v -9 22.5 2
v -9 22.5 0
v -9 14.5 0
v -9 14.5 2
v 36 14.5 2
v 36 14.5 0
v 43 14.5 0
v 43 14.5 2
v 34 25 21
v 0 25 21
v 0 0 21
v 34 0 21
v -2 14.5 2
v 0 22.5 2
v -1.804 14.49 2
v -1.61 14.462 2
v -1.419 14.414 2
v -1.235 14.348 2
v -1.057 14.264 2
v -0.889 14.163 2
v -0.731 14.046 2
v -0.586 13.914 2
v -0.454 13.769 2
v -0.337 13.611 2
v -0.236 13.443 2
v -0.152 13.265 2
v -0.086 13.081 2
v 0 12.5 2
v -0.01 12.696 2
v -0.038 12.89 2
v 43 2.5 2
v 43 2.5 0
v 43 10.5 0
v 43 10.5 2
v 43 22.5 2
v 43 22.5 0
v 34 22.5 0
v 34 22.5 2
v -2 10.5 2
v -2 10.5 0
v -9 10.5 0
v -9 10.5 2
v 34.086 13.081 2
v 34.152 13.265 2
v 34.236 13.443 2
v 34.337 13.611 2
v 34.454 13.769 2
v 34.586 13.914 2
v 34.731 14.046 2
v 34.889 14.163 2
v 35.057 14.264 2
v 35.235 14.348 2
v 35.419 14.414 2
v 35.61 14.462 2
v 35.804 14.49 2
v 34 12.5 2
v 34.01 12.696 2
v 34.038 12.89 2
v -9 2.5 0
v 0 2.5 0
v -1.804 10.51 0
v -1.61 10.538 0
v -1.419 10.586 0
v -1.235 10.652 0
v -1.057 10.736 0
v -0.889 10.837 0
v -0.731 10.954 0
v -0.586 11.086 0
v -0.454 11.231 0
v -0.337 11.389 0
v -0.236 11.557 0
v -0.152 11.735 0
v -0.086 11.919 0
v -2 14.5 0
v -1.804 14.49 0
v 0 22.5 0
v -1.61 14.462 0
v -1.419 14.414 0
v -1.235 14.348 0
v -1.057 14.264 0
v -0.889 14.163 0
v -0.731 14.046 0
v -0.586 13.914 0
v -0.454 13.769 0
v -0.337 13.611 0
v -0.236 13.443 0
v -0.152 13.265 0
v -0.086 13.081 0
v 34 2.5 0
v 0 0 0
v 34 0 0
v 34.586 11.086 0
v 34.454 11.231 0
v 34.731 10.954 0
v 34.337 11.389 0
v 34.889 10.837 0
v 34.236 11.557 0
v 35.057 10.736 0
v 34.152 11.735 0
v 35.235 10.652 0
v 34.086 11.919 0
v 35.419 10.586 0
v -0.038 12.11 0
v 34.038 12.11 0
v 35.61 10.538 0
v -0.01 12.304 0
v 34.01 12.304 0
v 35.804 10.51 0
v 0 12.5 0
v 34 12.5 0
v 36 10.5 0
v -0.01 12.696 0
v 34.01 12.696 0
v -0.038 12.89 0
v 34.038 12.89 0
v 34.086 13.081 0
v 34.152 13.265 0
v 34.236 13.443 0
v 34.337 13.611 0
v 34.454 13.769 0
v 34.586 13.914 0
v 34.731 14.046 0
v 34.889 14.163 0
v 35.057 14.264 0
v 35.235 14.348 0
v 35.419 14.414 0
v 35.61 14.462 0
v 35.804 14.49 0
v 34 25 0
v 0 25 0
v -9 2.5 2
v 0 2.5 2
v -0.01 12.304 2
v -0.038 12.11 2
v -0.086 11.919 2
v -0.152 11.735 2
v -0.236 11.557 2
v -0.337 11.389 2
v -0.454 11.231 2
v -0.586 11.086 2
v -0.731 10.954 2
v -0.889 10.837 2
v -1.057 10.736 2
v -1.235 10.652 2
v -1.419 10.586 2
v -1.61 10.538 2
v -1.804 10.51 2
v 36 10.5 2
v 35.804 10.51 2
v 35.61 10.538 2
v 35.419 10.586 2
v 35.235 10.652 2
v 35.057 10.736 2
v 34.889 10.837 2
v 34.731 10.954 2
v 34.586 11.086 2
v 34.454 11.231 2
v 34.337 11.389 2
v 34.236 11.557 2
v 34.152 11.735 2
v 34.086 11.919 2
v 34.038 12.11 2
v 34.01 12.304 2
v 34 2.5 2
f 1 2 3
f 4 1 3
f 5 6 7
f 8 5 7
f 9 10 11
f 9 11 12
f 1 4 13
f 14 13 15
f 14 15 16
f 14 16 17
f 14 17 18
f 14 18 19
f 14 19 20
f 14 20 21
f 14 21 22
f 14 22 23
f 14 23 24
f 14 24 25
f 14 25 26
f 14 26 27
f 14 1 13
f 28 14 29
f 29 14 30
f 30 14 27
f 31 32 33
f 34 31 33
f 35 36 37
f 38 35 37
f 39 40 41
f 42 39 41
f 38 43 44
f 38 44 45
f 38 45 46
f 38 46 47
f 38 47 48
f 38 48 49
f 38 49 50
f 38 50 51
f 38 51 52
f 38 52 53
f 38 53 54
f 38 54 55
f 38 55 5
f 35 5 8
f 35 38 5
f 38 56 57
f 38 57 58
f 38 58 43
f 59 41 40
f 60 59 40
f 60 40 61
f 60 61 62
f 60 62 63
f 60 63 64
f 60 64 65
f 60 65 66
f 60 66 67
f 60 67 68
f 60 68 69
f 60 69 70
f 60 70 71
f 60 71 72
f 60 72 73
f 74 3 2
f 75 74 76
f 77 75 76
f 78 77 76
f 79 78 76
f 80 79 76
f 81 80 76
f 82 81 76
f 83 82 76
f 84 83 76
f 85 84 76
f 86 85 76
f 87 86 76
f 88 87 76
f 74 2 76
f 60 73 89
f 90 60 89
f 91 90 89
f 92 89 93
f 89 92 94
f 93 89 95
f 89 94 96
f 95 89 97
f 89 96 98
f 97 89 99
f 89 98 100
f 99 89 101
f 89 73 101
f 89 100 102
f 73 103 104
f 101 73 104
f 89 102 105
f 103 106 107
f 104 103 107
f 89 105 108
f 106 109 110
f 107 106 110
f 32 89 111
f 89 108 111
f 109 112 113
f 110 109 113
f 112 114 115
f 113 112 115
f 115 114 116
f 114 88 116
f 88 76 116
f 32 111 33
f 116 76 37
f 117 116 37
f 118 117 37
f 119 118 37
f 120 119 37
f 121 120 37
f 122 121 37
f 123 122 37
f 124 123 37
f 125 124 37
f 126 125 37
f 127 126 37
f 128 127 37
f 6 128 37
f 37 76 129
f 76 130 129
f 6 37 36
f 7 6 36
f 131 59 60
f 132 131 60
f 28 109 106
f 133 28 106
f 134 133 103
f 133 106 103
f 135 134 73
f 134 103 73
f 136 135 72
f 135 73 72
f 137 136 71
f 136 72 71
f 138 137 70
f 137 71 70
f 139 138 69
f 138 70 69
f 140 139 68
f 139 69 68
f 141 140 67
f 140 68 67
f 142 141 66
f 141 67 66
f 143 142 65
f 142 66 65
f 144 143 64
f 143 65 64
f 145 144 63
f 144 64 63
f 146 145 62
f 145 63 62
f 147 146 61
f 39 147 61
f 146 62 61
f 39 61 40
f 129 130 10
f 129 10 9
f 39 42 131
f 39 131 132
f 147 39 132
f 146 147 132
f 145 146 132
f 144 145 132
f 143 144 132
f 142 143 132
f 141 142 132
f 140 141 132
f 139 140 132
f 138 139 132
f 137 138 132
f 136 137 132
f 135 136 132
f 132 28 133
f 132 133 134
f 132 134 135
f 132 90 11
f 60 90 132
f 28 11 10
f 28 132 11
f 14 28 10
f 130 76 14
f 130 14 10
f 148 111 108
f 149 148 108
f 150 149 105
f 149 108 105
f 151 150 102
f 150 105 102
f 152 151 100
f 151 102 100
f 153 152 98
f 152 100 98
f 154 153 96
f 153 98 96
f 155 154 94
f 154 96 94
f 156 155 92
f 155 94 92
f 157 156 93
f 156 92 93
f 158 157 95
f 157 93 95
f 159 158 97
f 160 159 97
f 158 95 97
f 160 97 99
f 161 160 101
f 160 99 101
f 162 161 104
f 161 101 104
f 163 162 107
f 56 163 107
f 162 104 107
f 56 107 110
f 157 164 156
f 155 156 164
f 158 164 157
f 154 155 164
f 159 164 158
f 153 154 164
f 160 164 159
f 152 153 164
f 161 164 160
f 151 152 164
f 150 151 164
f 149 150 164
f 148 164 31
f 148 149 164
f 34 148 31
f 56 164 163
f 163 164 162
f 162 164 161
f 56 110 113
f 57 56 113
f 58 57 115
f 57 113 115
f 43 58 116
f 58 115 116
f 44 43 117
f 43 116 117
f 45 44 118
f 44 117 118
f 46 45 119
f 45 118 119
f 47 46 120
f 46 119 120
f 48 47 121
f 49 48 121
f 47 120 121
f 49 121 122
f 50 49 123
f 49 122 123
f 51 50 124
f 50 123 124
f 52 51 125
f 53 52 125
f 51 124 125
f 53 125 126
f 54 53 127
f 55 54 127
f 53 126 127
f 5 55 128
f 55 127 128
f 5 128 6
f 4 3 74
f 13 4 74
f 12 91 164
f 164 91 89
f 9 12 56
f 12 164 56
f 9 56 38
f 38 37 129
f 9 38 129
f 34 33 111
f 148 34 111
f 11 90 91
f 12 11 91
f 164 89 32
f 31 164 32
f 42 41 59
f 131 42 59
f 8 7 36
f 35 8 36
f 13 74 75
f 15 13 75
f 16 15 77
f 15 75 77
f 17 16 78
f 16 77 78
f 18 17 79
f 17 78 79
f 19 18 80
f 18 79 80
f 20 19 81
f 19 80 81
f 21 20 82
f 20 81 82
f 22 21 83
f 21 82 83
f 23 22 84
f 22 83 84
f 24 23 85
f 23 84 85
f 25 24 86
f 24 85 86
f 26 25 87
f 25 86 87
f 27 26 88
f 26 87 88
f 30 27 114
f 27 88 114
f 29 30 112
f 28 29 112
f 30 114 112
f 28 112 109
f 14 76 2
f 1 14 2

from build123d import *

# Parameters (mm, degrees)
SKETCH1_W           = 34
SKETCH1_H           = 25
BOSS_EXTRUDE1_DEPTH = 21
BOSS_EXTRUDE2_DEPTH = 2


with BuildPart() as part:
    # Sketch1 → Boss-Extrude1 (new body)
    with BuildSketch(Plane.XY):
        with Locations((17, 12.5)):
            Rectangle(SKETCH1_W, SKETCH1_H)
    extrude(amount=BOSS_EXTRUDE1_DEPTH)

    # Sketch3 → Boss-Extrude2 (add)
    with BuildSketch(Plane.XY):
        with BuildLine():
            Line((0, 12.5), (0, 22.5))
            Line((0, 22.5), (-9, 22.5))
            Line((-9, 22.5), (-9, 14.5))
            Line((-9, 14.5), (-2, 14.5))
            ThreePointArc((-2, 14.5), (-0.585786438, 13.914213562), (0, 12.5))
        make_face()
        with BuildLine():
            Line((0, 2.5), (0, 12.5))
            ThreePointArc((0, 12.5), (-0.585786438, 11.085786438), (-2, 10.5))
            Line((-2, 10.5), (-9, 10.5))
            Line((-9, 10.5), (-9, 2.5))
            Line((-9, 2.5), (0, 2.5))
        make_face()
        with BuildLine():
            ThreePointArc((36, 10.5), (34.585786455, 11.08578642), (34, 12.499999949))
            Line((34, 12.499999949), (34, 2.5))
            Line((34, 2.5), (43, 2.5))
            Line((43, 2.5), (43, 10.5))
            Line((43, 10.5), (36, 10.5))
        make_face()
        with BuildLine():
            Line((43, 22.5), (34, 22.5))
            Line((34, 22.5), (34, 12.499999949))
            ThreePointArc((34, 12.499999949), (34.58578642, 13.914213545), (36, 14.5))
            Line((36, 14.5), (43, 14.5))
            Line((43, 14.5), (43, 22.5))
        make_face()
    extrude(amount=BOSS_EXTRUDE2_DEPTH)


solid = part.part
